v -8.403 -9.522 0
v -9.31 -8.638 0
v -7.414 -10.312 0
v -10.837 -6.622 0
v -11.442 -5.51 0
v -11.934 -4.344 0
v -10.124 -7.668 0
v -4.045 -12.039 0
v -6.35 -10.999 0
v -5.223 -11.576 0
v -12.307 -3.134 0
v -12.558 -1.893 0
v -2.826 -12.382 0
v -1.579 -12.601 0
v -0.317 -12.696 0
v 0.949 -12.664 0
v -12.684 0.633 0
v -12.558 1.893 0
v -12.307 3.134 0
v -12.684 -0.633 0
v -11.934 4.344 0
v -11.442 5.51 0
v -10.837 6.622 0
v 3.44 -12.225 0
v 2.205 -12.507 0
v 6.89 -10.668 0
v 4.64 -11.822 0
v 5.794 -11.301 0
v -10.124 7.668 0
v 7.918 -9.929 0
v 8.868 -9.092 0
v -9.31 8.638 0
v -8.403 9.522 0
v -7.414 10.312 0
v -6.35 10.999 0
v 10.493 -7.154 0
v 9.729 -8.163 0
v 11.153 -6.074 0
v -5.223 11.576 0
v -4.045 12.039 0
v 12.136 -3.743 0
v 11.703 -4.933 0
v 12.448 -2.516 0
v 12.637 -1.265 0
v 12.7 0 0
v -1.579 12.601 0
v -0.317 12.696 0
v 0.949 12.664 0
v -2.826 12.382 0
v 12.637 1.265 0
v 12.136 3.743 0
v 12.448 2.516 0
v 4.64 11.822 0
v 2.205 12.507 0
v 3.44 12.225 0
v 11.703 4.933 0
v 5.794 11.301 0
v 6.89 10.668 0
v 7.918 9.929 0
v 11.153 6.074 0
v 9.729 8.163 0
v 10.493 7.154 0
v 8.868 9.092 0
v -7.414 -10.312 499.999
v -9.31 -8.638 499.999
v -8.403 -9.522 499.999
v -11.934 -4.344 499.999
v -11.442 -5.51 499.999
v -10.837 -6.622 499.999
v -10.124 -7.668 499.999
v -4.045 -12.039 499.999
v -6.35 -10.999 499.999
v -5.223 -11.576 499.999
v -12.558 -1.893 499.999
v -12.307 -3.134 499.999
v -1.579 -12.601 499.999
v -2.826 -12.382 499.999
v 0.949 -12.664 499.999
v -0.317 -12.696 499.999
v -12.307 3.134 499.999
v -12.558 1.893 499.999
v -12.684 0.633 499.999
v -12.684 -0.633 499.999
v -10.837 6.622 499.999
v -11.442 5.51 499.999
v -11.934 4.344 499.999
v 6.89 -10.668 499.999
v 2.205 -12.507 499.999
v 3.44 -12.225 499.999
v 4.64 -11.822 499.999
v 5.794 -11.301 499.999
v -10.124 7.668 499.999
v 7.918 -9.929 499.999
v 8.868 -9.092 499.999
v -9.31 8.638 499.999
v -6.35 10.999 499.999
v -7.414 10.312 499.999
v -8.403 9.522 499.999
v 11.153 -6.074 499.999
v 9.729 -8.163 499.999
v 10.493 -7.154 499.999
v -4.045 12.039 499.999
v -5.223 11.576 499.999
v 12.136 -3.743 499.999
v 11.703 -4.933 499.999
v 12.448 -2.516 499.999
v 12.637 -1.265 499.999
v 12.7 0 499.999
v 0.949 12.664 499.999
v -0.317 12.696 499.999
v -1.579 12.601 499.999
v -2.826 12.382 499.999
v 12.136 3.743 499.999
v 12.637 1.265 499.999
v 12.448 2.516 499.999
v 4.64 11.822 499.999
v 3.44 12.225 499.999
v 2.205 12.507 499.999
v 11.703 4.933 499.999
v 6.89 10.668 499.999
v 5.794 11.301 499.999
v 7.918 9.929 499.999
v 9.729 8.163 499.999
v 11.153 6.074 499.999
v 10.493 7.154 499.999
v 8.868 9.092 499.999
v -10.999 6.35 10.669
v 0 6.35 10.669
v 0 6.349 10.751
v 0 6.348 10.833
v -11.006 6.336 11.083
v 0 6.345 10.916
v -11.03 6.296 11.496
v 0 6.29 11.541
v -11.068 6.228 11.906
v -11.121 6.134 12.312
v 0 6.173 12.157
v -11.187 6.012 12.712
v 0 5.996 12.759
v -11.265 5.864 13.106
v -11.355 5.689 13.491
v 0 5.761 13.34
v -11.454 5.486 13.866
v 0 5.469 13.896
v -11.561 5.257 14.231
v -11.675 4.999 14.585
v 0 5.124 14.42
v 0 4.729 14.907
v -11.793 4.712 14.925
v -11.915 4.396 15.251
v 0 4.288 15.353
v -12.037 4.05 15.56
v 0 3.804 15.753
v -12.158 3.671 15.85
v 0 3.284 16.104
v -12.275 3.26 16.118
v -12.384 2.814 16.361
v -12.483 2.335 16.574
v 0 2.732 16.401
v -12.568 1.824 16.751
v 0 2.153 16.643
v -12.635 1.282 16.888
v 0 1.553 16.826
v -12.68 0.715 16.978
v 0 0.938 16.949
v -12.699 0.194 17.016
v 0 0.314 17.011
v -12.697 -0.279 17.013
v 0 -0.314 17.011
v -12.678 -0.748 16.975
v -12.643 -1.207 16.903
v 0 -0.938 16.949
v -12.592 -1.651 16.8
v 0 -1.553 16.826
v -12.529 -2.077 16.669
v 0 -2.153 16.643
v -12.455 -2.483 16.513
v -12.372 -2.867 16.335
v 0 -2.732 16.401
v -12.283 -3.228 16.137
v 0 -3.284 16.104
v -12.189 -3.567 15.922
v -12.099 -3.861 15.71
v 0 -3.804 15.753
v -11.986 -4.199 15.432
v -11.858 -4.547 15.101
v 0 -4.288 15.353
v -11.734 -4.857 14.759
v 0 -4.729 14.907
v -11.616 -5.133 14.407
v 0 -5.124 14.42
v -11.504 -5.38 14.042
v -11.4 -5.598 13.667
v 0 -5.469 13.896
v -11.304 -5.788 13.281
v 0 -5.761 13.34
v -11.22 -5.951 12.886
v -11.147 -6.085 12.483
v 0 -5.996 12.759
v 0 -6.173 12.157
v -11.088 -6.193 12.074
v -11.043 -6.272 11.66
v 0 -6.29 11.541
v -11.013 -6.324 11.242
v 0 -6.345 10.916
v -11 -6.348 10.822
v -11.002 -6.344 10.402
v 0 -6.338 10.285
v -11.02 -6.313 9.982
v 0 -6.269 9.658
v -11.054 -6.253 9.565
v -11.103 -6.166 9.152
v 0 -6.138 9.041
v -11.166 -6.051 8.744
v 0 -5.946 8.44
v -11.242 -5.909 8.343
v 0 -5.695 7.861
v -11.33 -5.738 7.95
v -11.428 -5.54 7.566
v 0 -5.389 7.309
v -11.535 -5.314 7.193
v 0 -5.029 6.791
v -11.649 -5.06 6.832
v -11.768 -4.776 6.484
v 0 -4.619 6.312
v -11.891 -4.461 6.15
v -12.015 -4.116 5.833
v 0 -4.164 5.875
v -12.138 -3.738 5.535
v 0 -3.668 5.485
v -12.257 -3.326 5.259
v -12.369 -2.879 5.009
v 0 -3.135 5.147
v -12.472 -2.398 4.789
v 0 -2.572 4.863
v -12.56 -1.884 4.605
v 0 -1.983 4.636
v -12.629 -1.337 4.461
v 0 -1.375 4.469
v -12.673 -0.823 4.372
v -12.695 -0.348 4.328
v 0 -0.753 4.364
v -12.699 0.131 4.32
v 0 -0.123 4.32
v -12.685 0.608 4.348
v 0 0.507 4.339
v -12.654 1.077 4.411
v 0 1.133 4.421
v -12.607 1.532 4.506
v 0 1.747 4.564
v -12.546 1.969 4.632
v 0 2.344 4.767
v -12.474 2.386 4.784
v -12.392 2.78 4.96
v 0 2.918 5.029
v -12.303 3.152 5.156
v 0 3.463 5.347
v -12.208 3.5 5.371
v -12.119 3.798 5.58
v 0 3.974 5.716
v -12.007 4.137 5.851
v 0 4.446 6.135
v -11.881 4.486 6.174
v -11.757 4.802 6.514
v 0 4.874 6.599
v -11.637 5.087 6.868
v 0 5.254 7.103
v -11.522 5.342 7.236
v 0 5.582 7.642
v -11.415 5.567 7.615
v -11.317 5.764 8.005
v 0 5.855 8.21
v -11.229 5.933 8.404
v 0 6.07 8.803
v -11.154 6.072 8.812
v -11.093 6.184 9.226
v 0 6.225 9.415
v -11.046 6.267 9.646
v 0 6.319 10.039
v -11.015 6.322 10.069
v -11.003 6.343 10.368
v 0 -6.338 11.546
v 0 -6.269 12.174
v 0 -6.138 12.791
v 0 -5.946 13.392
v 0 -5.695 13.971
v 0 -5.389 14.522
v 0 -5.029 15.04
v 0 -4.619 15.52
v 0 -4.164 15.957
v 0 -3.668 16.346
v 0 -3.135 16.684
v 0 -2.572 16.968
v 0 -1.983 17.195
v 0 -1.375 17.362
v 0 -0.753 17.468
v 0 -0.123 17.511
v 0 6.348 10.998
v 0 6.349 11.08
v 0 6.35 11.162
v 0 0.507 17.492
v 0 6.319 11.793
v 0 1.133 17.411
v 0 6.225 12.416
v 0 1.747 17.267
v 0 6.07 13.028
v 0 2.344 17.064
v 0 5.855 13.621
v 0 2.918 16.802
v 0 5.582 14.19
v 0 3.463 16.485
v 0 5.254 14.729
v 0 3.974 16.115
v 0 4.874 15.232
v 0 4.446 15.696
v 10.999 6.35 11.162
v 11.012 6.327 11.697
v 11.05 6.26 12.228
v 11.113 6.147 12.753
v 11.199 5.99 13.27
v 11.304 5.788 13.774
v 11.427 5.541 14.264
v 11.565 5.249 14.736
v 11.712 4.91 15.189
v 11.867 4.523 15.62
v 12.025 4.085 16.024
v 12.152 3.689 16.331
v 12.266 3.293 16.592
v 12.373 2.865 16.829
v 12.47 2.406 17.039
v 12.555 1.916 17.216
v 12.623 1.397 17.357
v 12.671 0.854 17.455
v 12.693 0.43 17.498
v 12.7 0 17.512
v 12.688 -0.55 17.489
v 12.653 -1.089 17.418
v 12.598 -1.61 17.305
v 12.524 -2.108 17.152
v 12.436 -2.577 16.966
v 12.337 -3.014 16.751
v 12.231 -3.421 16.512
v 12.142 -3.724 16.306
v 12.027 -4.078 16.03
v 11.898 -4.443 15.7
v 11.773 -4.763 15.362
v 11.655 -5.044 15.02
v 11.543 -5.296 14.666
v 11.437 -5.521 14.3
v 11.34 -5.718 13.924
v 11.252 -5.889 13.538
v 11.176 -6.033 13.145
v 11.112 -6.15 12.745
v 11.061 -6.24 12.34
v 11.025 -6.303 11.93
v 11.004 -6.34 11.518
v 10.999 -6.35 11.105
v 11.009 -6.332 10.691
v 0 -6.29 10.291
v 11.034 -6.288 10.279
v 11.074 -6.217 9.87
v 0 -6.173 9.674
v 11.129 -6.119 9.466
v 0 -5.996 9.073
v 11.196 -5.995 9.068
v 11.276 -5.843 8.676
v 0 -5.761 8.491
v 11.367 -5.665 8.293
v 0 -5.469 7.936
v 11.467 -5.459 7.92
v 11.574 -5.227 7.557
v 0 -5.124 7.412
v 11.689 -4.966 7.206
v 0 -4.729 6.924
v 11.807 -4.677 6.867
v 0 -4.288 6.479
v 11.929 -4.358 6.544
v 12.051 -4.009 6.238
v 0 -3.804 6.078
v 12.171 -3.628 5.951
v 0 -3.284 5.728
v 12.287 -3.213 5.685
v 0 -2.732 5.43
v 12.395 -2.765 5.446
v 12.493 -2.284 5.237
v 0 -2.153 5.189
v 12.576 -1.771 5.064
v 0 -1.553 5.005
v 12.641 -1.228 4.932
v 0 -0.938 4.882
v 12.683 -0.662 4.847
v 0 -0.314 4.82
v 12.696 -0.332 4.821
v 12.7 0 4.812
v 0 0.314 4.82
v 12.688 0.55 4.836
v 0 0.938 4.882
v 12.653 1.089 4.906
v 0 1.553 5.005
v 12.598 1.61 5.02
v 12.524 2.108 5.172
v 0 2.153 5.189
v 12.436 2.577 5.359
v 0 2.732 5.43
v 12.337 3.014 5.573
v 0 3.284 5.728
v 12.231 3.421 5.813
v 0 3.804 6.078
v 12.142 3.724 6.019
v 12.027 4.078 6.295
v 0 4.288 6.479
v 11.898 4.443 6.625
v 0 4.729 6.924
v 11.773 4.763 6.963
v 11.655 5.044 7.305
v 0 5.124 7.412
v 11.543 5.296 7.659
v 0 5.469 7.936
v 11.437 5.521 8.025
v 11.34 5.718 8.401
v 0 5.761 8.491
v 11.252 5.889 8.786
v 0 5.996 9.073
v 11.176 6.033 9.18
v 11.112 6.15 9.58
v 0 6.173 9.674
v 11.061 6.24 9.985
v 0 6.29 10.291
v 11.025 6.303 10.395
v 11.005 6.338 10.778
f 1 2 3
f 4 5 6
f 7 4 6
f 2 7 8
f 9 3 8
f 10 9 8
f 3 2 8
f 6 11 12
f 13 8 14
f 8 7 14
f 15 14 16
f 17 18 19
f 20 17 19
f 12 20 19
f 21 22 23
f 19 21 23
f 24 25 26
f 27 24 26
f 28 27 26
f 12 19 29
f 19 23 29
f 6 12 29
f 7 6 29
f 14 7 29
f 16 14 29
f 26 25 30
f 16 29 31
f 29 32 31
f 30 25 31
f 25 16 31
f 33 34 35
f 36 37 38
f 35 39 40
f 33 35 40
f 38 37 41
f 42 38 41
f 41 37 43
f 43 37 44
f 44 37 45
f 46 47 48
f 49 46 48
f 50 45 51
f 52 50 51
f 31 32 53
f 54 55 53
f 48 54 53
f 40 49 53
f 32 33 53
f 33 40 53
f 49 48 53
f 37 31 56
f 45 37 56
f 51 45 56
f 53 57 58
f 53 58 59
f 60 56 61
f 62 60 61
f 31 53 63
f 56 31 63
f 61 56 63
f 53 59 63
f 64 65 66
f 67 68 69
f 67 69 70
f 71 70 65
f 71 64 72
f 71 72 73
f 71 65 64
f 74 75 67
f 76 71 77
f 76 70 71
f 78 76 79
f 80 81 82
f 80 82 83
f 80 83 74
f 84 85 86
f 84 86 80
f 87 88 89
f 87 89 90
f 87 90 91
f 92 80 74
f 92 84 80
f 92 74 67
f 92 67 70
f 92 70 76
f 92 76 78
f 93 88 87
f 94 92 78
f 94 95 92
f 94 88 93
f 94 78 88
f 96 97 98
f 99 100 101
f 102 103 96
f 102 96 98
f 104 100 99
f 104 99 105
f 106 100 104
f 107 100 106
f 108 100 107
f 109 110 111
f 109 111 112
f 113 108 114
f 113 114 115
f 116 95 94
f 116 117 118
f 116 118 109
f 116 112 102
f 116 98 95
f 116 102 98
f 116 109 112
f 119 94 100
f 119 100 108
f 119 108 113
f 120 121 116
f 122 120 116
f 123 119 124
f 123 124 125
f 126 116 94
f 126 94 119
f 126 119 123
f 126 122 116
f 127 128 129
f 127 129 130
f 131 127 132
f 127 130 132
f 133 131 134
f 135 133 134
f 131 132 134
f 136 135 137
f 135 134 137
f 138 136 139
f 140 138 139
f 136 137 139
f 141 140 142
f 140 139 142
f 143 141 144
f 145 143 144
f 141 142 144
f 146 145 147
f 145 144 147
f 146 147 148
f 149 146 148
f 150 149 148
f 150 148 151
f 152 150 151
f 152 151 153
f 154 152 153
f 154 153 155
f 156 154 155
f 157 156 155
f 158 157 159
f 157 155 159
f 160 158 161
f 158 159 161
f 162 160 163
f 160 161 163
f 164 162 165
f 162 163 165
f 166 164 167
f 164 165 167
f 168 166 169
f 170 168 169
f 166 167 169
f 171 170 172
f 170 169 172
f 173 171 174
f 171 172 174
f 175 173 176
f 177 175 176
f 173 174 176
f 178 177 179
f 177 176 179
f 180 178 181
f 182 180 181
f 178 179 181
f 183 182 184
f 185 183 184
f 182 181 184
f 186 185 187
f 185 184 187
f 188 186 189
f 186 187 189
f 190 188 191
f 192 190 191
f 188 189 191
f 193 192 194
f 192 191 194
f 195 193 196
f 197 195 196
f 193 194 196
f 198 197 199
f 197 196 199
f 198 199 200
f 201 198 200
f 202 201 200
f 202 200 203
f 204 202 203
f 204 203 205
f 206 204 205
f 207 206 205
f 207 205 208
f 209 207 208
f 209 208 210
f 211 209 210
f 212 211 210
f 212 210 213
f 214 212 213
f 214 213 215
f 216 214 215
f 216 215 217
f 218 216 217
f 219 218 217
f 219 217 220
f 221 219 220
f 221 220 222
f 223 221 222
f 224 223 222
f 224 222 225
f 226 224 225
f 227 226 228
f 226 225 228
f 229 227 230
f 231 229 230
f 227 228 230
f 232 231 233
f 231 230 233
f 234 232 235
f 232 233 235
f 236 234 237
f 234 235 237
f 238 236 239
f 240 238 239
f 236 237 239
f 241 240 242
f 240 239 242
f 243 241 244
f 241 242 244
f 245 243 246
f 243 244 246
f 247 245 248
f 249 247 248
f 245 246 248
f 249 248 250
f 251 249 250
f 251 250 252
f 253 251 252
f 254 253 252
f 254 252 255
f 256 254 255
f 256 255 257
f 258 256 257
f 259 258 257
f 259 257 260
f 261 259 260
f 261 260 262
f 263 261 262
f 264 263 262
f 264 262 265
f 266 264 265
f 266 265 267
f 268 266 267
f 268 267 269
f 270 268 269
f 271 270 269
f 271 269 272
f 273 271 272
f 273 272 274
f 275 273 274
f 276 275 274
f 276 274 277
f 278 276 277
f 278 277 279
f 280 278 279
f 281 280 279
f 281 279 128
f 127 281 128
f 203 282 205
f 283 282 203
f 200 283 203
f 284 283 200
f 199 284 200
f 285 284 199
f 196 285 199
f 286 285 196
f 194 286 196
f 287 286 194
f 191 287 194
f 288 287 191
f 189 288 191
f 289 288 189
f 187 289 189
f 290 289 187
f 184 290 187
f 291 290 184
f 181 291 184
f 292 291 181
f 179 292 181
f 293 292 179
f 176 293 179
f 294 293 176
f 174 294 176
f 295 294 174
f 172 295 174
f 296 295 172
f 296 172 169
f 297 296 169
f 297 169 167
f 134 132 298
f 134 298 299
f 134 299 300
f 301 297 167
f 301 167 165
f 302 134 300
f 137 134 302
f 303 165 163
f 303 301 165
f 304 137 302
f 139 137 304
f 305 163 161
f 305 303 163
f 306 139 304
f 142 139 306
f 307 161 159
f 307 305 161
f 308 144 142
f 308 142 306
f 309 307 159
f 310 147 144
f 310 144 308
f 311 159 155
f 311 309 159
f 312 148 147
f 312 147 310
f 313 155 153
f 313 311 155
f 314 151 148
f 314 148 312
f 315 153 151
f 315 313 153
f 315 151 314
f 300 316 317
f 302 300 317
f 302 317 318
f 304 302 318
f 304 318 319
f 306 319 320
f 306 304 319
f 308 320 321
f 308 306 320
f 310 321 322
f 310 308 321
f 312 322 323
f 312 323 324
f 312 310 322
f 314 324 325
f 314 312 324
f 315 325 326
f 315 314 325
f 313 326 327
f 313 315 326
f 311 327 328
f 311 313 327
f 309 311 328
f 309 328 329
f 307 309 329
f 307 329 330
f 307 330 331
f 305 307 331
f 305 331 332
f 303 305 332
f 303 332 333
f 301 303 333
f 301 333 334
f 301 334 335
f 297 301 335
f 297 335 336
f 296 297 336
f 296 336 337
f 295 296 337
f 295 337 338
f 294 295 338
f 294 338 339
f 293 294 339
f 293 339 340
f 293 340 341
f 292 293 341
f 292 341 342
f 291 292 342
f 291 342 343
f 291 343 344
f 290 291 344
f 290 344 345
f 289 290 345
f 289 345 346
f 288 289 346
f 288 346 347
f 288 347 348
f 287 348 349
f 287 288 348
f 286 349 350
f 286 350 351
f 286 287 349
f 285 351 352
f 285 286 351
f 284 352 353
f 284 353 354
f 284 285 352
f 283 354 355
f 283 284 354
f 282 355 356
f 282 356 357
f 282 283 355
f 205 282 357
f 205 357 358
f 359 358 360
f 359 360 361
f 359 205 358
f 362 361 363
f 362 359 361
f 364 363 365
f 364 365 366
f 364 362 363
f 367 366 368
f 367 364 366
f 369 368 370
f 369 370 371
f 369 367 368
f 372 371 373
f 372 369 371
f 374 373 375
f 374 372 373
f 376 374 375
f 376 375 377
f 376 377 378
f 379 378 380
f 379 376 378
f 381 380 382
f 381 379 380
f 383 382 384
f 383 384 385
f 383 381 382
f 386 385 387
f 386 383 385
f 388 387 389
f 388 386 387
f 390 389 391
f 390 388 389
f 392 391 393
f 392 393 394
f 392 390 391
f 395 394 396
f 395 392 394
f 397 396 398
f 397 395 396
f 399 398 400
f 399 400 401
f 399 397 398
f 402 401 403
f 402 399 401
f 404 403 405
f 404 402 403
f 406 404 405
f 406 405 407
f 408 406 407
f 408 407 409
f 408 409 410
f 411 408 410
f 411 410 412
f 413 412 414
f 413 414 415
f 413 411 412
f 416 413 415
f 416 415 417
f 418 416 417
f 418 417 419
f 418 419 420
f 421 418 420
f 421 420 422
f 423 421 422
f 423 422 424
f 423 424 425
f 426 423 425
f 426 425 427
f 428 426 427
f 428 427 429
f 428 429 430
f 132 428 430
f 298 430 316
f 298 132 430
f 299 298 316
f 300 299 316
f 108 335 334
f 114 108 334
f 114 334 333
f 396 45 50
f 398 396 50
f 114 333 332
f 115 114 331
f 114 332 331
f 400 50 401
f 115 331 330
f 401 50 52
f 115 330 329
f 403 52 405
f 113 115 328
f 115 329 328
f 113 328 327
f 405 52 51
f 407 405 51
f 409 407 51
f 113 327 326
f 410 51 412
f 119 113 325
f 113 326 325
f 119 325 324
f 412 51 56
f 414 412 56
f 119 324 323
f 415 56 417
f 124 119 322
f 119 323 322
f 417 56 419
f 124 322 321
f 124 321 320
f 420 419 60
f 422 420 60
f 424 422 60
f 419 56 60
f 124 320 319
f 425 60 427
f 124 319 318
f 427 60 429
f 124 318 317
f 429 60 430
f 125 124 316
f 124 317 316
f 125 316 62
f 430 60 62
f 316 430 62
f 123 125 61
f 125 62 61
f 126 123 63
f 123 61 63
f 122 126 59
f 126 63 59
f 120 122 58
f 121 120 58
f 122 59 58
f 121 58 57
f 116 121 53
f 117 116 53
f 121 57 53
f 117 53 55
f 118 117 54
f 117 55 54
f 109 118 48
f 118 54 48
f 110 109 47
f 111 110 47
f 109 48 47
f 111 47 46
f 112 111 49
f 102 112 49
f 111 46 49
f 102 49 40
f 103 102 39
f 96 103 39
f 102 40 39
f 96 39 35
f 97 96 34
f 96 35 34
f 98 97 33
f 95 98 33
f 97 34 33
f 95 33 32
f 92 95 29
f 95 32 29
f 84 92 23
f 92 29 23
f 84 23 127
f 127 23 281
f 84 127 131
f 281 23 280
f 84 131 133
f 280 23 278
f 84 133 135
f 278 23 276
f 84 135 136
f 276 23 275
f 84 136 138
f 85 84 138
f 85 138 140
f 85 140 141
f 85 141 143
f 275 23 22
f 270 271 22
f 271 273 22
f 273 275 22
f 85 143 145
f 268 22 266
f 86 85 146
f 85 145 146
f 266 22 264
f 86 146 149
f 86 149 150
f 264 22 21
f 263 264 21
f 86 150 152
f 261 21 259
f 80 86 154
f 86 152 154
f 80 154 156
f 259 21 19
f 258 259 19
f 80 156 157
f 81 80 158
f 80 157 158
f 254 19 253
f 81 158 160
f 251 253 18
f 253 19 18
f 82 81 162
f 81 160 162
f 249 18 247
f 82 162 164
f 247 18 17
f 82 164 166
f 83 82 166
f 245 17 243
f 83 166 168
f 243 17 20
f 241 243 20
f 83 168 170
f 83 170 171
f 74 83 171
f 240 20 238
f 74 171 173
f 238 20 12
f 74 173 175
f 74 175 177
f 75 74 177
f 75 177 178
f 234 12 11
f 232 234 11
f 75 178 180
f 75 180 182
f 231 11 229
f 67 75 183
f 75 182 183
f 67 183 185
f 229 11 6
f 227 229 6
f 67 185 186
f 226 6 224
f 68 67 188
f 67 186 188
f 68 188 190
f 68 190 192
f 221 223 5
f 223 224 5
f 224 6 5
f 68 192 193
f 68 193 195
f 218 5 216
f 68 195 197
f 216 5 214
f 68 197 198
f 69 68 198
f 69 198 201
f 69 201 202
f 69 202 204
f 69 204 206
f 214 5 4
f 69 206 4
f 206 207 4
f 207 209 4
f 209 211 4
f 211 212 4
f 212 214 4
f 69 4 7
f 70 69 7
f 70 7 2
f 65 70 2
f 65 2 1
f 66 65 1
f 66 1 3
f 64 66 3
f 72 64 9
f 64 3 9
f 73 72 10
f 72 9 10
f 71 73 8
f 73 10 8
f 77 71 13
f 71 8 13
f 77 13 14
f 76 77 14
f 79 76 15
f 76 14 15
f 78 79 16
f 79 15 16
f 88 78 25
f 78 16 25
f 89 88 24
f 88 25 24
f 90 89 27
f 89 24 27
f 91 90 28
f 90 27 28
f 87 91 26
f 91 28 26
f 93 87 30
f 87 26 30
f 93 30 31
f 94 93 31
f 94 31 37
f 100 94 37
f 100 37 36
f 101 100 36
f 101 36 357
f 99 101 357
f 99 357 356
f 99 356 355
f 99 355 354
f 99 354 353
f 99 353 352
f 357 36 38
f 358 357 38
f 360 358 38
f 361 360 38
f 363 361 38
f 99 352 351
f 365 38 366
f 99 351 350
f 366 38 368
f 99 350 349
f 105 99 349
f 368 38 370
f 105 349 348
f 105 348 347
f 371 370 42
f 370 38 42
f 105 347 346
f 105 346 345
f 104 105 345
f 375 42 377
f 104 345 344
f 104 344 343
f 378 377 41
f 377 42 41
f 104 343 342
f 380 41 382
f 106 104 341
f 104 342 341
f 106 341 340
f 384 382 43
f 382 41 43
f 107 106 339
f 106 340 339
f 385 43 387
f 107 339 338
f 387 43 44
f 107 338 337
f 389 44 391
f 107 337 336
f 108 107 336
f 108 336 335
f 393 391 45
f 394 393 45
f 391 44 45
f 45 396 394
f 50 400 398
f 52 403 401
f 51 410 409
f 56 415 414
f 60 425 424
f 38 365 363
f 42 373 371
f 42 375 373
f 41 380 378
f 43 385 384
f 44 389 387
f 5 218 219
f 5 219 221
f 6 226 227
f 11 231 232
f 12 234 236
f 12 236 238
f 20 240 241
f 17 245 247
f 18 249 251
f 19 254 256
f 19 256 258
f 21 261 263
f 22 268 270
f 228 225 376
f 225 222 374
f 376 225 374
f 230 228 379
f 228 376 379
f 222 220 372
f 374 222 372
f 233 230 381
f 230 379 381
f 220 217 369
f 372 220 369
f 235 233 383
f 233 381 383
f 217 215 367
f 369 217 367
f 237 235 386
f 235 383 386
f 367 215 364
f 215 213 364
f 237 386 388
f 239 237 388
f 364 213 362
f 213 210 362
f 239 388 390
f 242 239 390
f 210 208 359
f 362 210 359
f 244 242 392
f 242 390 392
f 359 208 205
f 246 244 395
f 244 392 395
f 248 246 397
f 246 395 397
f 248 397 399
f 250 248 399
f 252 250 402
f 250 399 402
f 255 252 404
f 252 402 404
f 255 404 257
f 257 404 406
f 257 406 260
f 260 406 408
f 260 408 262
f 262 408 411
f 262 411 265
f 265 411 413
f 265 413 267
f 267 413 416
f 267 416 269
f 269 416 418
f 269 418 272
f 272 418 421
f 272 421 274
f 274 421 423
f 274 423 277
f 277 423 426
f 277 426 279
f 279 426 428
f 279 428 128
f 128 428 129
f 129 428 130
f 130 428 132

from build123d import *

# Parameters (mm, degrees)
F0_R     = 12.7
F1_DEPTH = 499.999
F2_R     = 6.35
F3_DEPTH = 76.2
F4_R     = 6.35
F5_DEPTH = 76.2


with BuildPart() as f1:
    # F0 (on Top) → F1 (new body)
    with BuildSketch(Plane.XY):
        Circle(F0_R)
    extrude(amount=F1_DEPTH)

    # F2 (on Right) → F3 (cut)
    with BuildSketch(Plane.YZ):
        with Locations((0, 11.162438)):
            Circle(F2_R)
    extrude(amount=F3_DEPTH, mode=Mode.SUBTRACT)

    # F4 (on Right) → F5 (cut)
    with BuildSketch(Plane.YZ):
        with Locations((0, 10.668855)):
            Circle(F4_R)
    extrude(amount=-F5_DEPTH, mode=Mode.SUBTRACT)


solid = f1.part
